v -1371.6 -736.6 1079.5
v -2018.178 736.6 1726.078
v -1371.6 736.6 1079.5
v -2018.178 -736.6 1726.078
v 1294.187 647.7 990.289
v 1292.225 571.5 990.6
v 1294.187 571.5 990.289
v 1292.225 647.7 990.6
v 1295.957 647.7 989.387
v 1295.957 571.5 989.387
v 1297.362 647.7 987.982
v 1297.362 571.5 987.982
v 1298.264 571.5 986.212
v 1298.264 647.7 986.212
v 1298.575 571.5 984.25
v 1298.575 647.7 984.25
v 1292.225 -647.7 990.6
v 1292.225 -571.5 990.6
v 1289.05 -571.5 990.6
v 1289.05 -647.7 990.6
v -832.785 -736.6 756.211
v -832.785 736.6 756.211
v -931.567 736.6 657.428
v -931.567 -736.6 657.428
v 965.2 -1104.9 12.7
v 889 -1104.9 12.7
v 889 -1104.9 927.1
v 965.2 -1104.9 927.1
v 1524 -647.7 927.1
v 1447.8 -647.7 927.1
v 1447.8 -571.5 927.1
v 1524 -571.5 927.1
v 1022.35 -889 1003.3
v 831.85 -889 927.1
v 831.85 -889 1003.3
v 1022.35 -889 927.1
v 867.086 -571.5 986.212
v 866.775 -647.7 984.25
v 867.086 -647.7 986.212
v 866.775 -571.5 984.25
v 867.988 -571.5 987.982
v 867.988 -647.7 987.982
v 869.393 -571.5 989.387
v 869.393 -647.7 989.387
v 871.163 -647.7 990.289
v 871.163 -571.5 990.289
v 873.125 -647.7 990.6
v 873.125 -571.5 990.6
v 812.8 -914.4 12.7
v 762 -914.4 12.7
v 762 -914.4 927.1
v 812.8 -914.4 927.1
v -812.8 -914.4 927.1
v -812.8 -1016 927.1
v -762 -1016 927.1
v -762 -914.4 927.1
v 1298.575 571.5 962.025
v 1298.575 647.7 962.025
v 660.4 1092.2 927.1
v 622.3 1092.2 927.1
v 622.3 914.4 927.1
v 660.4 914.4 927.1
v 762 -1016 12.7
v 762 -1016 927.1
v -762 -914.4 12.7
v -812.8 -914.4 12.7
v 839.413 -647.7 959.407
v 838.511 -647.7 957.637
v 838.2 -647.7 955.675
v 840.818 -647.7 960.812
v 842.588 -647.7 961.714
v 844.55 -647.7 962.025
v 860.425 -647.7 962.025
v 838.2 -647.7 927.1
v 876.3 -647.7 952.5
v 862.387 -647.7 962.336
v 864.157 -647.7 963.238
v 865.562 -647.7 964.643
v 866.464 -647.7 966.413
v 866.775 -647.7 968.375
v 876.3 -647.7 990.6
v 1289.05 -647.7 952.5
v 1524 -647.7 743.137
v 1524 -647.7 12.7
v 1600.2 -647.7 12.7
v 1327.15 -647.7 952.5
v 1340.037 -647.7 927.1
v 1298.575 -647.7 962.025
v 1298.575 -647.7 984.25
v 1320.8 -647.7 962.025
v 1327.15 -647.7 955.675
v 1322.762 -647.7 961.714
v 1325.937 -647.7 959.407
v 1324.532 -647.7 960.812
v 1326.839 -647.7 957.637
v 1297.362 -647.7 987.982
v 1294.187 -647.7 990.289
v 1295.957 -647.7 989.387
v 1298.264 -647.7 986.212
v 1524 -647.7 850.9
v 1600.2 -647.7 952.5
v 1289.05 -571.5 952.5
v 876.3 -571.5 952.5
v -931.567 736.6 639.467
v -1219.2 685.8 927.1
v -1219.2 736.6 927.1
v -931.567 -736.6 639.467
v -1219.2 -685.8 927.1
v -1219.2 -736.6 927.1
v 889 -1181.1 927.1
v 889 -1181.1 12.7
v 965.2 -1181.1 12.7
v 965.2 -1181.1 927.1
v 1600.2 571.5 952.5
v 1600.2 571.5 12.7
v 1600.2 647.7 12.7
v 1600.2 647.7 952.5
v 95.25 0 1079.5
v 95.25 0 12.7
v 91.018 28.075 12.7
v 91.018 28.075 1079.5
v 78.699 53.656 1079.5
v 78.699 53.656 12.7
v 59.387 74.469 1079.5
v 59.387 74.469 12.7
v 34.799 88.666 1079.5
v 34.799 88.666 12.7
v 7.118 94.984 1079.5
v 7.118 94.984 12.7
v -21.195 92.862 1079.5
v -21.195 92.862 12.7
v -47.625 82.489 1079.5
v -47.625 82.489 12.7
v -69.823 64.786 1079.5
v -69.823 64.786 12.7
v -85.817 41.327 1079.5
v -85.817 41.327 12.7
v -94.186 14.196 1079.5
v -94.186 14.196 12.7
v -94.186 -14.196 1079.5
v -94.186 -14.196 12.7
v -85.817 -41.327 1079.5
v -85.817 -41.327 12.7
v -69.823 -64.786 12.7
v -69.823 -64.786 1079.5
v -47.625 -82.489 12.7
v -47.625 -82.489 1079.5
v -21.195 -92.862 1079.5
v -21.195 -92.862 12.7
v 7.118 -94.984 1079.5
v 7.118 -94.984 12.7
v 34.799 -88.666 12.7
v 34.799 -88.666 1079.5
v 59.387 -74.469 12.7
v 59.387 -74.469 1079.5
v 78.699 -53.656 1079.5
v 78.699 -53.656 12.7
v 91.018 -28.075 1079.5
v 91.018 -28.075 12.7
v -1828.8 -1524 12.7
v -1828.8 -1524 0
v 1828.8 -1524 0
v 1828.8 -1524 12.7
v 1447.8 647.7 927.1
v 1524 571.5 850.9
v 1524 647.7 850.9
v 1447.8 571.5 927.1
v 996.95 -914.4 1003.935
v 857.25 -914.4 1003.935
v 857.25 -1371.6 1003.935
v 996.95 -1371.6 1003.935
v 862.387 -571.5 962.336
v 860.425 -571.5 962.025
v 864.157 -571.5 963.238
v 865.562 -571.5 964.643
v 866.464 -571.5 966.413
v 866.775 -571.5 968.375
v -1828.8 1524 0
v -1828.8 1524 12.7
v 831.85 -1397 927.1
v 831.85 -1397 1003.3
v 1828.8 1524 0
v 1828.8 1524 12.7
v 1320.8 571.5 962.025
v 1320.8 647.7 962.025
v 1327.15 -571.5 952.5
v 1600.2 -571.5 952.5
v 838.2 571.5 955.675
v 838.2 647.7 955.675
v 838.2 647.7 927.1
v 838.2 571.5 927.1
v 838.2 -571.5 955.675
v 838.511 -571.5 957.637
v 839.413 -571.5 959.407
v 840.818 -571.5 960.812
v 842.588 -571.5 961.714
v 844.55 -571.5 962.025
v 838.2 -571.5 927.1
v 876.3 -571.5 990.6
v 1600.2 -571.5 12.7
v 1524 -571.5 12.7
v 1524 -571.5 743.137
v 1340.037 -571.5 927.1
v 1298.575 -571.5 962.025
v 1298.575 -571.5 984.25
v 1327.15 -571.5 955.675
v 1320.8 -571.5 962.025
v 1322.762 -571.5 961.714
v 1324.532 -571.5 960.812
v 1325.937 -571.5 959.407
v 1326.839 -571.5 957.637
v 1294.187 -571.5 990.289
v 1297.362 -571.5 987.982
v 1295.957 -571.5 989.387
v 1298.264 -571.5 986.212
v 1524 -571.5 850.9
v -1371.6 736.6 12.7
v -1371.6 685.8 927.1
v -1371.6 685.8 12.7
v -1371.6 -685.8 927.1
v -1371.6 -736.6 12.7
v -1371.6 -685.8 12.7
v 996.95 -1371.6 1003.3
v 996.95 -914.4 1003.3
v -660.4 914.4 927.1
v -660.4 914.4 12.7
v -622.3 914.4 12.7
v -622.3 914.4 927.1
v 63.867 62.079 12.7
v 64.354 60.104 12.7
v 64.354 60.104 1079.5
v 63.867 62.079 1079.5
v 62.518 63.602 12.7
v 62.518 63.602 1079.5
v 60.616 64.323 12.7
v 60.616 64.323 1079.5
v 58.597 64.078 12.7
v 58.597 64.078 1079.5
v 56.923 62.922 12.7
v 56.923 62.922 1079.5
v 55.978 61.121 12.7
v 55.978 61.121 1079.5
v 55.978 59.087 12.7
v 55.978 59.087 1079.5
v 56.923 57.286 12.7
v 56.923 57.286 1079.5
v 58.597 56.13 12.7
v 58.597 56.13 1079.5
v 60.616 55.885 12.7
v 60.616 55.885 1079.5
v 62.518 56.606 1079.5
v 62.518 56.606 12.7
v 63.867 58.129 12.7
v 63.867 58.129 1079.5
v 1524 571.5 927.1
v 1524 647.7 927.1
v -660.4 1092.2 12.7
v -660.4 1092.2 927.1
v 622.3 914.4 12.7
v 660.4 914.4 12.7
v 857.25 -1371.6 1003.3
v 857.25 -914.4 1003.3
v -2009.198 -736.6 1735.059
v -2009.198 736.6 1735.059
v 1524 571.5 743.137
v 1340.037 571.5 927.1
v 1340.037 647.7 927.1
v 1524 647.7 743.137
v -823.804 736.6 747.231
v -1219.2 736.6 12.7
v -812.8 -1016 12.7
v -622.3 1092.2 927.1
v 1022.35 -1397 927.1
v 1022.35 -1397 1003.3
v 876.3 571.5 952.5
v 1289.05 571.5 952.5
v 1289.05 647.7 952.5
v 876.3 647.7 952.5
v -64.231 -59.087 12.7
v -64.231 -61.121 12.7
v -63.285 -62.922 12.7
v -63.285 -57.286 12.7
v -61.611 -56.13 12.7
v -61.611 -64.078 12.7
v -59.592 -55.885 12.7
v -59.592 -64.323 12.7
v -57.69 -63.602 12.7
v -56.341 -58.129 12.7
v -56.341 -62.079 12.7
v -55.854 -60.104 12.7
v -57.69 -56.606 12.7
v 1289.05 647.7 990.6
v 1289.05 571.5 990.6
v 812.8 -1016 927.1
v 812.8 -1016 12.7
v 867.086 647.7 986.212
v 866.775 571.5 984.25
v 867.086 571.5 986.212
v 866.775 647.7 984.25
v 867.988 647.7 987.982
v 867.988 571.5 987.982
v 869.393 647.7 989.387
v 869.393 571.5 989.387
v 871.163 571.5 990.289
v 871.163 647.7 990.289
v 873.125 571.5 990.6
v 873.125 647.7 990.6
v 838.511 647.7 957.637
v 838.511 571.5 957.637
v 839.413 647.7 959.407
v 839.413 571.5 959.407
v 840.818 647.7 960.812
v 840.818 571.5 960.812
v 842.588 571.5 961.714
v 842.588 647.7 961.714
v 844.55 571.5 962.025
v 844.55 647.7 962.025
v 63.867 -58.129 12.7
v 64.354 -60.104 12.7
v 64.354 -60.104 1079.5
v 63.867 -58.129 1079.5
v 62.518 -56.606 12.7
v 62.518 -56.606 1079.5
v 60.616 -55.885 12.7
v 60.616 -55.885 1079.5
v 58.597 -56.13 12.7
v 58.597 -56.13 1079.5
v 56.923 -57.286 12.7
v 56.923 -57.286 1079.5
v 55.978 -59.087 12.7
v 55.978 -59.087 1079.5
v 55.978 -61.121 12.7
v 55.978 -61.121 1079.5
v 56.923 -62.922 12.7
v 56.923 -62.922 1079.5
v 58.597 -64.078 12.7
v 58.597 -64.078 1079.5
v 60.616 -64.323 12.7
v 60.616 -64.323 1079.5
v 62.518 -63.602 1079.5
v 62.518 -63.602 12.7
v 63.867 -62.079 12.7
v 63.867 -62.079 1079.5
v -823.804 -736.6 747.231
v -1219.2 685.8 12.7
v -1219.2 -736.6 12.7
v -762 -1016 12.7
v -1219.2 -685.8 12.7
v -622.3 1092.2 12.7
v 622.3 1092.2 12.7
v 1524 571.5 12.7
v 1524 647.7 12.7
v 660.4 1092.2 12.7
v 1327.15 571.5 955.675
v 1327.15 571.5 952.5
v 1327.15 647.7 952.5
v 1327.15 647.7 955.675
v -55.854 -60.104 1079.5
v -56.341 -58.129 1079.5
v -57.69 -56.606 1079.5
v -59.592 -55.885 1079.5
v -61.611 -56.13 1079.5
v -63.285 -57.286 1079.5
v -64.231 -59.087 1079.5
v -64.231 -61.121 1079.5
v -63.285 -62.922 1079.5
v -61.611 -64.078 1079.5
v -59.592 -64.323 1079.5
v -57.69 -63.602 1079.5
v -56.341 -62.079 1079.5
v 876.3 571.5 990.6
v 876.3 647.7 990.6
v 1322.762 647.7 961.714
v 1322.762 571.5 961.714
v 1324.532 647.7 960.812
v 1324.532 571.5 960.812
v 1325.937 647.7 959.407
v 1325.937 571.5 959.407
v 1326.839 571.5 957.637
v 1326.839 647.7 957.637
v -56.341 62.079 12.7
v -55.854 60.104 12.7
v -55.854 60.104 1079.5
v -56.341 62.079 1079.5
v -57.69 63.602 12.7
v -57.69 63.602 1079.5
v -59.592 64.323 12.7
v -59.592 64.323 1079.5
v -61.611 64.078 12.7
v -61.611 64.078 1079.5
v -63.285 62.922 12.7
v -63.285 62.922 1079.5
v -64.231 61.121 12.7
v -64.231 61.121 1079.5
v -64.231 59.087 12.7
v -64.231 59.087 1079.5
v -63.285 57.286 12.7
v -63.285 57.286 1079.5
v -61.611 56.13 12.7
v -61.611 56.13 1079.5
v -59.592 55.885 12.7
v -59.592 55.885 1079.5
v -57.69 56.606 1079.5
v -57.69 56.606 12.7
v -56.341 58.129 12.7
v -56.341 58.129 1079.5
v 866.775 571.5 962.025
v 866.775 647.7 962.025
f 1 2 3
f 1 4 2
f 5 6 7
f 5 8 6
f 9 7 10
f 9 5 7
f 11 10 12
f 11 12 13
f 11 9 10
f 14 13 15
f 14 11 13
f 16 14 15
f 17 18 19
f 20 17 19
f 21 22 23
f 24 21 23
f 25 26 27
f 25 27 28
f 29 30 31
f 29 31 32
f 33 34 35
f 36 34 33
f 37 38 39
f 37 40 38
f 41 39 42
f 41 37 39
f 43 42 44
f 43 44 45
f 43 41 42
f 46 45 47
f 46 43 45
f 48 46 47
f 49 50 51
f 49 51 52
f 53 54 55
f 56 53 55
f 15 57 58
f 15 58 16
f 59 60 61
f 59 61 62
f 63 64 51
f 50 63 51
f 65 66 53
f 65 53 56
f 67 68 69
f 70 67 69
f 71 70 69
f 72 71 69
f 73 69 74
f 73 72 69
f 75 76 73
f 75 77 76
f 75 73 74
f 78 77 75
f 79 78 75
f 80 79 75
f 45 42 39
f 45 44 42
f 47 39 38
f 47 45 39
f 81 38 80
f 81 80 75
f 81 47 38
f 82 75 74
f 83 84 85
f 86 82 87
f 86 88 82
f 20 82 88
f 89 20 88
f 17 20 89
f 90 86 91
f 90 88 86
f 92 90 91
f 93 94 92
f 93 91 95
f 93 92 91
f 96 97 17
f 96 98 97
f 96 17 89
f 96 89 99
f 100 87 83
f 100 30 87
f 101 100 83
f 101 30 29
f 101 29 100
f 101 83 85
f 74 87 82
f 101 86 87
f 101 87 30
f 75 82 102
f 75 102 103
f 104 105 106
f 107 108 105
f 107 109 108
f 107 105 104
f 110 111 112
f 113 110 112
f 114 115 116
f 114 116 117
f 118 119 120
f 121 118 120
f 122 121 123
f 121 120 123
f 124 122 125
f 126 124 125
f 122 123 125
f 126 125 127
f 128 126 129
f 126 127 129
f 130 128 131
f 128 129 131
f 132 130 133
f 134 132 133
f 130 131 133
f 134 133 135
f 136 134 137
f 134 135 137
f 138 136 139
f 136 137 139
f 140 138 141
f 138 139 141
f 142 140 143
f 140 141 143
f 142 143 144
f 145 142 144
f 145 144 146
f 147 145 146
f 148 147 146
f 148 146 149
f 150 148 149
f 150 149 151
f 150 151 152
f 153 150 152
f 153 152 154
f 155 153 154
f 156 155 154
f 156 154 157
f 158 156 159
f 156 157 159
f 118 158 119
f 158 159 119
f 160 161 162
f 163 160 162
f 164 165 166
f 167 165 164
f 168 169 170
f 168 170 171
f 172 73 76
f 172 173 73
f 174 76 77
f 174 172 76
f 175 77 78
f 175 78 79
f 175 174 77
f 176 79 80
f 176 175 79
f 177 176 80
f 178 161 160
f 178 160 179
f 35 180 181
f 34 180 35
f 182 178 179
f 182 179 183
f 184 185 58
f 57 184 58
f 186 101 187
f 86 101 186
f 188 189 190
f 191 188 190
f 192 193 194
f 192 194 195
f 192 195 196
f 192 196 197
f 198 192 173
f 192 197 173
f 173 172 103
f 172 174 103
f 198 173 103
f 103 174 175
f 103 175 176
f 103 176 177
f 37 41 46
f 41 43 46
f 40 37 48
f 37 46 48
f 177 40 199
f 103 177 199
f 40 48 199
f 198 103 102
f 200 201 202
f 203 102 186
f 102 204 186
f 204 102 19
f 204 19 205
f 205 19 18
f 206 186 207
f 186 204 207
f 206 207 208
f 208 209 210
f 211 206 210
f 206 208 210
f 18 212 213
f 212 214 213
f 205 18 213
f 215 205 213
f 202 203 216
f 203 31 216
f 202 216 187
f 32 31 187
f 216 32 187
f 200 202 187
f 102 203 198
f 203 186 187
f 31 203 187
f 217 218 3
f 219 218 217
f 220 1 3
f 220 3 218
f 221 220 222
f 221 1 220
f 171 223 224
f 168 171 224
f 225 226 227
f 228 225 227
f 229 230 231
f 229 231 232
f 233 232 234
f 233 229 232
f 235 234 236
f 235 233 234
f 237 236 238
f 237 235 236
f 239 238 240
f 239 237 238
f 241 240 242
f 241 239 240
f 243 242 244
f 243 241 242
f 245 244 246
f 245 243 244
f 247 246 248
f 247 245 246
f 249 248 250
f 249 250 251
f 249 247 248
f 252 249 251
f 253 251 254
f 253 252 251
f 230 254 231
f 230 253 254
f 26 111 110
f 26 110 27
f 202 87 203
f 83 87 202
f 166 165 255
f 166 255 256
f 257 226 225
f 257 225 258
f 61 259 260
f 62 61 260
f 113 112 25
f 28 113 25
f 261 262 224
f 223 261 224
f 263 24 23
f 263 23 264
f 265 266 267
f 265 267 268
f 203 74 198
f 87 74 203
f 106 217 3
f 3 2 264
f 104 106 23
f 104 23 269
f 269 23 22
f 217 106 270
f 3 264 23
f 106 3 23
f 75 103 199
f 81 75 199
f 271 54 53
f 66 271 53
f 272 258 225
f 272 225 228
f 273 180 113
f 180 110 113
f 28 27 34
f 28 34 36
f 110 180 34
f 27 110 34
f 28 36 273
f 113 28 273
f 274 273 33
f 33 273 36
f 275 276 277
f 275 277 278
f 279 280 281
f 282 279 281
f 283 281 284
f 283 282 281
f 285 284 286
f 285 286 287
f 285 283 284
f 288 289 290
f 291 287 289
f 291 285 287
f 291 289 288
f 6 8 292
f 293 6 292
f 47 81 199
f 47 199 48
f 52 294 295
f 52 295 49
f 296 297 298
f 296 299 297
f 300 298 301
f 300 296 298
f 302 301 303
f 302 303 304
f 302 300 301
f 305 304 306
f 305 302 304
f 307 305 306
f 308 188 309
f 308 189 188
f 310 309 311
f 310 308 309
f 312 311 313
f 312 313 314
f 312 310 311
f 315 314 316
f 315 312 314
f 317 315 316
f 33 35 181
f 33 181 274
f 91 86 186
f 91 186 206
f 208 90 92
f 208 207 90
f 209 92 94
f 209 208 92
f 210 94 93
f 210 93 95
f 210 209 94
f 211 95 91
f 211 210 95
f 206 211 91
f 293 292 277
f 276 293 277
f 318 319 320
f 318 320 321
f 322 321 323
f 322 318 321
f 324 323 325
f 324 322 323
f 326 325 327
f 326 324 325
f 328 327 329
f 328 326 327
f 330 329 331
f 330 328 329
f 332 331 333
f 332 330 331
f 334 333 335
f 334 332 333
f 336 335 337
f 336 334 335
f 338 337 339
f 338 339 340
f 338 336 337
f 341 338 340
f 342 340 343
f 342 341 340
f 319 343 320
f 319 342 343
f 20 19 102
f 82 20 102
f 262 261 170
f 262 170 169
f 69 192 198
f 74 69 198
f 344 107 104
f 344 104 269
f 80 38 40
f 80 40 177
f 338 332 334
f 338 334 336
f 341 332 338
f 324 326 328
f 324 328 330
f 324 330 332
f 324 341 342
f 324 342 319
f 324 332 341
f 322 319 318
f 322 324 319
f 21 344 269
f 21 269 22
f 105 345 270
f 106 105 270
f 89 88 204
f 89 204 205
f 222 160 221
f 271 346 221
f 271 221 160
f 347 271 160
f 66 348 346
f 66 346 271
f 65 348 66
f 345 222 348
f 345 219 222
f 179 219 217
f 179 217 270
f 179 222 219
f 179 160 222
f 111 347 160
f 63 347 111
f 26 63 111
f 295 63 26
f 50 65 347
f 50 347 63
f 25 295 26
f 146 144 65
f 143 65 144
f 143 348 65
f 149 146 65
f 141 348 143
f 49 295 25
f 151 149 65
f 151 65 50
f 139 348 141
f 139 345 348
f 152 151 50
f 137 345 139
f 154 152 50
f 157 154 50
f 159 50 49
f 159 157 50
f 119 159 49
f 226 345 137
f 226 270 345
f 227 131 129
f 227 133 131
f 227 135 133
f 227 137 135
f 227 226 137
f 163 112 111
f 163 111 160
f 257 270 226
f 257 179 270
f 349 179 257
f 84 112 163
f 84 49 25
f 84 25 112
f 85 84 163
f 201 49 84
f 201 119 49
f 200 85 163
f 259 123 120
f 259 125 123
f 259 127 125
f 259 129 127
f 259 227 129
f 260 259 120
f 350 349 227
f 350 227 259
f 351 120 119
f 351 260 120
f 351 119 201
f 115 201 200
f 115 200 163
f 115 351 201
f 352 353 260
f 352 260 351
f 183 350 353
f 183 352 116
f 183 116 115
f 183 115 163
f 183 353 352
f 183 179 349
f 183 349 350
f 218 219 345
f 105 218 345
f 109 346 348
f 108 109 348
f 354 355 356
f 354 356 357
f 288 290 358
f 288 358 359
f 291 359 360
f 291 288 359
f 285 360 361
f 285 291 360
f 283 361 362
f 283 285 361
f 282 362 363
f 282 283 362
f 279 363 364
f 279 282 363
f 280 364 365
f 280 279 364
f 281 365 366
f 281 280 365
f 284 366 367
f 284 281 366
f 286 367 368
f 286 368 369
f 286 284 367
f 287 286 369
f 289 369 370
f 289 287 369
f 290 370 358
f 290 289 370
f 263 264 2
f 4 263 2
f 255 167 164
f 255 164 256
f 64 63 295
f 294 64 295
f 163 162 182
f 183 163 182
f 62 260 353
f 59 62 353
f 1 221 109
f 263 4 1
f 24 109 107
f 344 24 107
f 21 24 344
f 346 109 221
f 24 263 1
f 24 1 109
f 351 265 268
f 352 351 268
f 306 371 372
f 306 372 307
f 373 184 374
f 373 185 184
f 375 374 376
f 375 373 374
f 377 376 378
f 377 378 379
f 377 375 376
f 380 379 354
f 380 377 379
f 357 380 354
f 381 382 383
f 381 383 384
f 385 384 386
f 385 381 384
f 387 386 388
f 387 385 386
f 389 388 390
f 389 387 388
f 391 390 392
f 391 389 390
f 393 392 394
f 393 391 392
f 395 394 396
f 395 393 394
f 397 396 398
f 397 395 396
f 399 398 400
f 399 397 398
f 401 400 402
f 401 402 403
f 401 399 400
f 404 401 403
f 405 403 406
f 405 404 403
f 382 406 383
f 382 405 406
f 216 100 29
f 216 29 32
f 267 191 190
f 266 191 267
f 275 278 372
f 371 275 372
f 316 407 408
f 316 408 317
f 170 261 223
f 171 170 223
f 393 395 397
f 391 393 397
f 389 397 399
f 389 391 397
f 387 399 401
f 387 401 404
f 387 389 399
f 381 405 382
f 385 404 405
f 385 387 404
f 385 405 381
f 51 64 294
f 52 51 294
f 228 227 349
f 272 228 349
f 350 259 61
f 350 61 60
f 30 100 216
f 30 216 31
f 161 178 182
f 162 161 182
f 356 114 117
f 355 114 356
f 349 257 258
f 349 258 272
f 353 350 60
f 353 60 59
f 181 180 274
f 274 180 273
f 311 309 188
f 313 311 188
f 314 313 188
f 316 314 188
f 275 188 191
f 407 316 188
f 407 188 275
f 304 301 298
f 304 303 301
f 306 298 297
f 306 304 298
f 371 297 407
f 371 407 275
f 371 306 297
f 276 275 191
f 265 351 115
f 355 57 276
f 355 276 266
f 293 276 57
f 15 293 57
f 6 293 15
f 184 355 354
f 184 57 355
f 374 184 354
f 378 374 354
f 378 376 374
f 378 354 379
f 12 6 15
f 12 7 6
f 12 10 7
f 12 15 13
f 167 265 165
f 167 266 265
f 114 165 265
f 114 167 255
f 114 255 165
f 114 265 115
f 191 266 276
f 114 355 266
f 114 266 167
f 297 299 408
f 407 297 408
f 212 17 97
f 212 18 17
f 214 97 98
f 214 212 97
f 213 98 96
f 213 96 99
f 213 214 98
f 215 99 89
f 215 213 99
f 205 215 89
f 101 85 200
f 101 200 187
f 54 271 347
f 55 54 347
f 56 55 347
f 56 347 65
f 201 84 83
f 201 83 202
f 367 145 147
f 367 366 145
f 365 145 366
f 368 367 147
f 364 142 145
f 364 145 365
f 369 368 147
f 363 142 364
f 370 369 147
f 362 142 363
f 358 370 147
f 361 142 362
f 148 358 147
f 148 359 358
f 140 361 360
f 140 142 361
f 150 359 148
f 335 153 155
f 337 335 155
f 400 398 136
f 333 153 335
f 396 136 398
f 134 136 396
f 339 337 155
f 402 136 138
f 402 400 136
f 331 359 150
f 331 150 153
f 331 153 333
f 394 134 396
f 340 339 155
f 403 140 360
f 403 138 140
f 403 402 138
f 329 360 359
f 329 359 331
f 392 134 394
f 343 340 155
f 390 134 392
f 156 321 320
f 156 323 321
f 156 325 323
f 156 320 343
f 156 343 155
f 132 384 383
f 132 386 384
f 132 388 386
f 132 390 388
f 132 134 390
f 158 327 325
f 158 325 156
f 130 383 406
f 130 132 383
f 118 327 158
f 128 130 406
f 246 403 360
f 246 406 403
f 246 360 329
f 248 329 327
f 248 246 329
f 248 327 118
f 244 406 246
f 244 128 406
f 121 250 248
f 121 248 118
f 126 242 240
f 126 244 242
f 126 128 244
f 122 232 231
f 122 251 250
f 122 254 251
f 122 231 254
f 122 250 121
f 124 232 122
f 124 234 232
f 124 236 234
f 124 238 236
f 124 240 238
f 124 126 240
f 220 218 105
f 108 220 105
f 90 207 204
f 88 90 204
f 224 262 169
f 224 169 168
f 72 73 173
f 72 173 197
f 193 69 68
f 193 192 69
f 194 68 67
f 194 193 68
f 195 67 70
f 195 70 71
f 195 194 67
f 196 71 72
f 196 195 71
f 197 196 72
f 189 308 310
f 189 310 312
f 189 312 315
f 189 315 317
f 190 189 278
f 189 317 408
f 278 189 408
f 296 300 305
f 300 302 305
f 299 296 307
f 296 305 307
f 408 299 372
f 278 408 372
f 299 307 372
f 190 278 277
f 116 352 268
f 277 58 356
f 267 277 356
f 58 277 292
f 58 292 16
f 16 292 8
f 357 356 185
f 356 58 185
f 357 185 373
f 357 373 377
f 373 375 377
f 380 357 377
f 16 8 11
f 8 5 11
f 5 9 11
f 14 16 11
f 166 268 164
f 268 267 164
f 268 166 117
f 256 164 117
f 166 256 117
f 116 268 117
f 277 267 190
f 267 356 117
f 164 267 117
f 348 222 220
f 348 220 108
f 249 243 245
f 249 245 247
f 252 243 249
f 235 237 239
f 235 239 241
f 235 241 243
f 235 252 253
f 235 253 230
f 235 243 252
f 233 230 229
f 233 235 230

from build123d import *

# Parameters (mm, degrees)
F0_W          = 3657.6
F0_H          = 3048
F1_DEPTH      = 12.7
F2_R          = 95.25
F2_R_2        = 4.25
F3_DEPTH      = 1066.8
F4_W          = 38.1
F4_H          = 177.8
F4_W_2        = 50.8
F4_H_2        = 101.6
F4_W_3        = 76.2
F4_H_3        = 76.2
F5_DEPTH      = 914.4
F6_W          = 152.4
F6_H          = 50.8
F7_DEPTH      = 914.4
F9_DEPTH      = 736.6
F9_DEPTH_BACK = 736.6
F11_DEPTH     = 76.2
F13_DEPTH     = 76.2
F14_R         = 6.35
F15_W         = 190.5
F15_H         = 508
F16_DEPTH     = 76.2
F17_W         = 139.7
F17_H         = 457.2
F18_DEPTH     = 0.635


with BuildPart() as f1:
    # F0 (on Top) → F1 (new body)
    with BuildSketch(Plane.XY):
        Rectangle(F0_W, F0_H)
    extrude(amount=F1_DEPTH)

    # F2 (on face) → F3 (join)
    with BuildSketch(Plane.XY.offset(12.7)):
        Circle(F2_R)
        with Locations((-60.1040764009, -60.1040764009)):
            Circle(F2_R_2, mode=Mode.SUBTRACT)
        with Locations((60.1040764009, -60.1040764009)):
            Circle(F2_R_2, mode=Mode.SUBTRACT)
        with Locations((-60.1040764009, 60.1040764009)):
            Circle(F2_R_2, mode=Mode.SUBTRACT)
        with Locations((60.1040764009, 60.1040764009)):
            Circle(F2_R_2, mode=Mode.SUBTRACT)
    extrude(amount=F3_DEPTH)

    # F4 (on face) → F5 (join)
    with BuildSketch(Plane.XY.offset(12.7)):
        with Locations((-641.35, 1003.3)):
            Rectangle(F4_W, F4_H)
        with Locations((641.35, 1003.3)):
            Rectangle(F4_W, F4_H)
        with Locations((-787.4, -965.2)):
            Rectangle(F4_W_2, F4_H_2)
        with Locations((787.4, -965.2)):
            Rectangle(F4_W_2, F4_H_2)
        with Locations((1562.1, 609.6)):
            Rectangle(F4_W_3, F4_H_3)
        with Locations((1562.1, -609.6)):
            Rectangle(F4_W_3, F4_H_3)
        with Locations((927.1, -1143)):
            Rectangle(F4_W_3, F4_H_3)
    extrude(amount=F5_DEPTH)

    # F6 (on face) → F7 (join)
    with BuildSketch(Plane.XY.offset(12.7)):
        with Locations((-1295.4, 711.2)):
            Rectangle(F6_W, F6_H)
        with Locations((-1295.4, -711.2)):
            Rectangle(F6_W, F6_H)
    extrude(amount=F7_DEPTH)

    # F8 (on Front) → F9 (join, two sides)
    with BuildSketch(Plane.XZ) as f9_sk:
        Polygon((-1371.6, 1079.5), (-1371.6, 927.1), (-1219.2, 927.1), (-931.5674500676, 639.4674500676), (-823.8043766148, 747.2305235204), (-832.7846327359, 756.2107796415), (-931.5674500676, 657.4279623097), (-2009.1981845959, 1735.058696838), (-2018.178440717, 1726.078440717), align=None)
    extrude(amount=F9_DEPTH)
    extrude(f9_sk.sketch, amount=-F9_DEPTH_BACK)

    # F10 (on face) → F11 (join, through all)
    with BuildSketch(Plane.XZ.offset(647.7)):
        Polygon((1447.8, 927.1), (1600.2, 927.1), (1600.2, 952.5), (1327.15, 952.5), (1327.15, 962.025), (1298.575, 962.025), (1298.575, 990.6), (1289.05, 990.6), (1289.05, 952.5), (876.3, 952.5), (876.3, 990.6), (866.775, 990.6), (866.775, 962.025), (838.2, 962.025), (838.2, 927.1), (1340.0369265472, 927.1), (1524, 743.1369265472), (1524, 850.9), align=None)
    extrude(amount=-F11_DEPTH)

    # F12 (on face) → F13 (join, through all)
    with BuildSketch(Plane.XZ.offset(-571.5)):
        Polygon((1447.8, 927.1), (1600.2, 927.1), (1600.2, 952.5), (1327.15, 952.5), (1327.15, 962.025), (1298.575, 962.025), (1298.575, 990.6), (1289.05, 990.6), (1289.05, 952.5), (876.3, 952.5), (876.3, 990.6), (866.775, 990.6), (866.775, 962.025), (838.2, 962.025), (838.2, 927.1), (1340.0369265472, 927.1), (1600.2, 666.9369265472), (1600.2, 774.7), align=None)
    extrude(amount=-F13_DEPTH)

    # F14
    f14_edges = [f1.edges().sort_by_distance(p)[0] for p in [
        (866.775, -609.6, 990.6),
        (1298.575, -609.6, 990.6),
        (1327.15, -609.6, 962.025),
        (866.775, 609.6, 990.6),
        (838.2, 609.6, 962.025),
        (1298.575, 609.6, 990.6),
        (1327.15, 609.6, 962.025),
        (866.775, -609.6, 962.025),
        (838.2, -609.6, 962.025),
    ]]
    fillet(f14_edges, radius=F14_R)

    # F15 (on face) → F16 (join)
    with BuildSketch(Plane.XY.offset(927.1)):
        with Locations((927.1, -1143)):
            Rectangle(F15_W, F15_H)
    extrude(amount=F16_DEPTH)


with BuildPart() as f18:
    # F17 (on face) → F18 (new body)
    with BuildSketch(Plane.XY.offset(1003.3)):
        with Locations((927.1, -1143)):
            Rectangle(F17_W, F17_H)
    extrude(amount=F18_DEPTH)


solid = Compound([f1.part, f18.part])
